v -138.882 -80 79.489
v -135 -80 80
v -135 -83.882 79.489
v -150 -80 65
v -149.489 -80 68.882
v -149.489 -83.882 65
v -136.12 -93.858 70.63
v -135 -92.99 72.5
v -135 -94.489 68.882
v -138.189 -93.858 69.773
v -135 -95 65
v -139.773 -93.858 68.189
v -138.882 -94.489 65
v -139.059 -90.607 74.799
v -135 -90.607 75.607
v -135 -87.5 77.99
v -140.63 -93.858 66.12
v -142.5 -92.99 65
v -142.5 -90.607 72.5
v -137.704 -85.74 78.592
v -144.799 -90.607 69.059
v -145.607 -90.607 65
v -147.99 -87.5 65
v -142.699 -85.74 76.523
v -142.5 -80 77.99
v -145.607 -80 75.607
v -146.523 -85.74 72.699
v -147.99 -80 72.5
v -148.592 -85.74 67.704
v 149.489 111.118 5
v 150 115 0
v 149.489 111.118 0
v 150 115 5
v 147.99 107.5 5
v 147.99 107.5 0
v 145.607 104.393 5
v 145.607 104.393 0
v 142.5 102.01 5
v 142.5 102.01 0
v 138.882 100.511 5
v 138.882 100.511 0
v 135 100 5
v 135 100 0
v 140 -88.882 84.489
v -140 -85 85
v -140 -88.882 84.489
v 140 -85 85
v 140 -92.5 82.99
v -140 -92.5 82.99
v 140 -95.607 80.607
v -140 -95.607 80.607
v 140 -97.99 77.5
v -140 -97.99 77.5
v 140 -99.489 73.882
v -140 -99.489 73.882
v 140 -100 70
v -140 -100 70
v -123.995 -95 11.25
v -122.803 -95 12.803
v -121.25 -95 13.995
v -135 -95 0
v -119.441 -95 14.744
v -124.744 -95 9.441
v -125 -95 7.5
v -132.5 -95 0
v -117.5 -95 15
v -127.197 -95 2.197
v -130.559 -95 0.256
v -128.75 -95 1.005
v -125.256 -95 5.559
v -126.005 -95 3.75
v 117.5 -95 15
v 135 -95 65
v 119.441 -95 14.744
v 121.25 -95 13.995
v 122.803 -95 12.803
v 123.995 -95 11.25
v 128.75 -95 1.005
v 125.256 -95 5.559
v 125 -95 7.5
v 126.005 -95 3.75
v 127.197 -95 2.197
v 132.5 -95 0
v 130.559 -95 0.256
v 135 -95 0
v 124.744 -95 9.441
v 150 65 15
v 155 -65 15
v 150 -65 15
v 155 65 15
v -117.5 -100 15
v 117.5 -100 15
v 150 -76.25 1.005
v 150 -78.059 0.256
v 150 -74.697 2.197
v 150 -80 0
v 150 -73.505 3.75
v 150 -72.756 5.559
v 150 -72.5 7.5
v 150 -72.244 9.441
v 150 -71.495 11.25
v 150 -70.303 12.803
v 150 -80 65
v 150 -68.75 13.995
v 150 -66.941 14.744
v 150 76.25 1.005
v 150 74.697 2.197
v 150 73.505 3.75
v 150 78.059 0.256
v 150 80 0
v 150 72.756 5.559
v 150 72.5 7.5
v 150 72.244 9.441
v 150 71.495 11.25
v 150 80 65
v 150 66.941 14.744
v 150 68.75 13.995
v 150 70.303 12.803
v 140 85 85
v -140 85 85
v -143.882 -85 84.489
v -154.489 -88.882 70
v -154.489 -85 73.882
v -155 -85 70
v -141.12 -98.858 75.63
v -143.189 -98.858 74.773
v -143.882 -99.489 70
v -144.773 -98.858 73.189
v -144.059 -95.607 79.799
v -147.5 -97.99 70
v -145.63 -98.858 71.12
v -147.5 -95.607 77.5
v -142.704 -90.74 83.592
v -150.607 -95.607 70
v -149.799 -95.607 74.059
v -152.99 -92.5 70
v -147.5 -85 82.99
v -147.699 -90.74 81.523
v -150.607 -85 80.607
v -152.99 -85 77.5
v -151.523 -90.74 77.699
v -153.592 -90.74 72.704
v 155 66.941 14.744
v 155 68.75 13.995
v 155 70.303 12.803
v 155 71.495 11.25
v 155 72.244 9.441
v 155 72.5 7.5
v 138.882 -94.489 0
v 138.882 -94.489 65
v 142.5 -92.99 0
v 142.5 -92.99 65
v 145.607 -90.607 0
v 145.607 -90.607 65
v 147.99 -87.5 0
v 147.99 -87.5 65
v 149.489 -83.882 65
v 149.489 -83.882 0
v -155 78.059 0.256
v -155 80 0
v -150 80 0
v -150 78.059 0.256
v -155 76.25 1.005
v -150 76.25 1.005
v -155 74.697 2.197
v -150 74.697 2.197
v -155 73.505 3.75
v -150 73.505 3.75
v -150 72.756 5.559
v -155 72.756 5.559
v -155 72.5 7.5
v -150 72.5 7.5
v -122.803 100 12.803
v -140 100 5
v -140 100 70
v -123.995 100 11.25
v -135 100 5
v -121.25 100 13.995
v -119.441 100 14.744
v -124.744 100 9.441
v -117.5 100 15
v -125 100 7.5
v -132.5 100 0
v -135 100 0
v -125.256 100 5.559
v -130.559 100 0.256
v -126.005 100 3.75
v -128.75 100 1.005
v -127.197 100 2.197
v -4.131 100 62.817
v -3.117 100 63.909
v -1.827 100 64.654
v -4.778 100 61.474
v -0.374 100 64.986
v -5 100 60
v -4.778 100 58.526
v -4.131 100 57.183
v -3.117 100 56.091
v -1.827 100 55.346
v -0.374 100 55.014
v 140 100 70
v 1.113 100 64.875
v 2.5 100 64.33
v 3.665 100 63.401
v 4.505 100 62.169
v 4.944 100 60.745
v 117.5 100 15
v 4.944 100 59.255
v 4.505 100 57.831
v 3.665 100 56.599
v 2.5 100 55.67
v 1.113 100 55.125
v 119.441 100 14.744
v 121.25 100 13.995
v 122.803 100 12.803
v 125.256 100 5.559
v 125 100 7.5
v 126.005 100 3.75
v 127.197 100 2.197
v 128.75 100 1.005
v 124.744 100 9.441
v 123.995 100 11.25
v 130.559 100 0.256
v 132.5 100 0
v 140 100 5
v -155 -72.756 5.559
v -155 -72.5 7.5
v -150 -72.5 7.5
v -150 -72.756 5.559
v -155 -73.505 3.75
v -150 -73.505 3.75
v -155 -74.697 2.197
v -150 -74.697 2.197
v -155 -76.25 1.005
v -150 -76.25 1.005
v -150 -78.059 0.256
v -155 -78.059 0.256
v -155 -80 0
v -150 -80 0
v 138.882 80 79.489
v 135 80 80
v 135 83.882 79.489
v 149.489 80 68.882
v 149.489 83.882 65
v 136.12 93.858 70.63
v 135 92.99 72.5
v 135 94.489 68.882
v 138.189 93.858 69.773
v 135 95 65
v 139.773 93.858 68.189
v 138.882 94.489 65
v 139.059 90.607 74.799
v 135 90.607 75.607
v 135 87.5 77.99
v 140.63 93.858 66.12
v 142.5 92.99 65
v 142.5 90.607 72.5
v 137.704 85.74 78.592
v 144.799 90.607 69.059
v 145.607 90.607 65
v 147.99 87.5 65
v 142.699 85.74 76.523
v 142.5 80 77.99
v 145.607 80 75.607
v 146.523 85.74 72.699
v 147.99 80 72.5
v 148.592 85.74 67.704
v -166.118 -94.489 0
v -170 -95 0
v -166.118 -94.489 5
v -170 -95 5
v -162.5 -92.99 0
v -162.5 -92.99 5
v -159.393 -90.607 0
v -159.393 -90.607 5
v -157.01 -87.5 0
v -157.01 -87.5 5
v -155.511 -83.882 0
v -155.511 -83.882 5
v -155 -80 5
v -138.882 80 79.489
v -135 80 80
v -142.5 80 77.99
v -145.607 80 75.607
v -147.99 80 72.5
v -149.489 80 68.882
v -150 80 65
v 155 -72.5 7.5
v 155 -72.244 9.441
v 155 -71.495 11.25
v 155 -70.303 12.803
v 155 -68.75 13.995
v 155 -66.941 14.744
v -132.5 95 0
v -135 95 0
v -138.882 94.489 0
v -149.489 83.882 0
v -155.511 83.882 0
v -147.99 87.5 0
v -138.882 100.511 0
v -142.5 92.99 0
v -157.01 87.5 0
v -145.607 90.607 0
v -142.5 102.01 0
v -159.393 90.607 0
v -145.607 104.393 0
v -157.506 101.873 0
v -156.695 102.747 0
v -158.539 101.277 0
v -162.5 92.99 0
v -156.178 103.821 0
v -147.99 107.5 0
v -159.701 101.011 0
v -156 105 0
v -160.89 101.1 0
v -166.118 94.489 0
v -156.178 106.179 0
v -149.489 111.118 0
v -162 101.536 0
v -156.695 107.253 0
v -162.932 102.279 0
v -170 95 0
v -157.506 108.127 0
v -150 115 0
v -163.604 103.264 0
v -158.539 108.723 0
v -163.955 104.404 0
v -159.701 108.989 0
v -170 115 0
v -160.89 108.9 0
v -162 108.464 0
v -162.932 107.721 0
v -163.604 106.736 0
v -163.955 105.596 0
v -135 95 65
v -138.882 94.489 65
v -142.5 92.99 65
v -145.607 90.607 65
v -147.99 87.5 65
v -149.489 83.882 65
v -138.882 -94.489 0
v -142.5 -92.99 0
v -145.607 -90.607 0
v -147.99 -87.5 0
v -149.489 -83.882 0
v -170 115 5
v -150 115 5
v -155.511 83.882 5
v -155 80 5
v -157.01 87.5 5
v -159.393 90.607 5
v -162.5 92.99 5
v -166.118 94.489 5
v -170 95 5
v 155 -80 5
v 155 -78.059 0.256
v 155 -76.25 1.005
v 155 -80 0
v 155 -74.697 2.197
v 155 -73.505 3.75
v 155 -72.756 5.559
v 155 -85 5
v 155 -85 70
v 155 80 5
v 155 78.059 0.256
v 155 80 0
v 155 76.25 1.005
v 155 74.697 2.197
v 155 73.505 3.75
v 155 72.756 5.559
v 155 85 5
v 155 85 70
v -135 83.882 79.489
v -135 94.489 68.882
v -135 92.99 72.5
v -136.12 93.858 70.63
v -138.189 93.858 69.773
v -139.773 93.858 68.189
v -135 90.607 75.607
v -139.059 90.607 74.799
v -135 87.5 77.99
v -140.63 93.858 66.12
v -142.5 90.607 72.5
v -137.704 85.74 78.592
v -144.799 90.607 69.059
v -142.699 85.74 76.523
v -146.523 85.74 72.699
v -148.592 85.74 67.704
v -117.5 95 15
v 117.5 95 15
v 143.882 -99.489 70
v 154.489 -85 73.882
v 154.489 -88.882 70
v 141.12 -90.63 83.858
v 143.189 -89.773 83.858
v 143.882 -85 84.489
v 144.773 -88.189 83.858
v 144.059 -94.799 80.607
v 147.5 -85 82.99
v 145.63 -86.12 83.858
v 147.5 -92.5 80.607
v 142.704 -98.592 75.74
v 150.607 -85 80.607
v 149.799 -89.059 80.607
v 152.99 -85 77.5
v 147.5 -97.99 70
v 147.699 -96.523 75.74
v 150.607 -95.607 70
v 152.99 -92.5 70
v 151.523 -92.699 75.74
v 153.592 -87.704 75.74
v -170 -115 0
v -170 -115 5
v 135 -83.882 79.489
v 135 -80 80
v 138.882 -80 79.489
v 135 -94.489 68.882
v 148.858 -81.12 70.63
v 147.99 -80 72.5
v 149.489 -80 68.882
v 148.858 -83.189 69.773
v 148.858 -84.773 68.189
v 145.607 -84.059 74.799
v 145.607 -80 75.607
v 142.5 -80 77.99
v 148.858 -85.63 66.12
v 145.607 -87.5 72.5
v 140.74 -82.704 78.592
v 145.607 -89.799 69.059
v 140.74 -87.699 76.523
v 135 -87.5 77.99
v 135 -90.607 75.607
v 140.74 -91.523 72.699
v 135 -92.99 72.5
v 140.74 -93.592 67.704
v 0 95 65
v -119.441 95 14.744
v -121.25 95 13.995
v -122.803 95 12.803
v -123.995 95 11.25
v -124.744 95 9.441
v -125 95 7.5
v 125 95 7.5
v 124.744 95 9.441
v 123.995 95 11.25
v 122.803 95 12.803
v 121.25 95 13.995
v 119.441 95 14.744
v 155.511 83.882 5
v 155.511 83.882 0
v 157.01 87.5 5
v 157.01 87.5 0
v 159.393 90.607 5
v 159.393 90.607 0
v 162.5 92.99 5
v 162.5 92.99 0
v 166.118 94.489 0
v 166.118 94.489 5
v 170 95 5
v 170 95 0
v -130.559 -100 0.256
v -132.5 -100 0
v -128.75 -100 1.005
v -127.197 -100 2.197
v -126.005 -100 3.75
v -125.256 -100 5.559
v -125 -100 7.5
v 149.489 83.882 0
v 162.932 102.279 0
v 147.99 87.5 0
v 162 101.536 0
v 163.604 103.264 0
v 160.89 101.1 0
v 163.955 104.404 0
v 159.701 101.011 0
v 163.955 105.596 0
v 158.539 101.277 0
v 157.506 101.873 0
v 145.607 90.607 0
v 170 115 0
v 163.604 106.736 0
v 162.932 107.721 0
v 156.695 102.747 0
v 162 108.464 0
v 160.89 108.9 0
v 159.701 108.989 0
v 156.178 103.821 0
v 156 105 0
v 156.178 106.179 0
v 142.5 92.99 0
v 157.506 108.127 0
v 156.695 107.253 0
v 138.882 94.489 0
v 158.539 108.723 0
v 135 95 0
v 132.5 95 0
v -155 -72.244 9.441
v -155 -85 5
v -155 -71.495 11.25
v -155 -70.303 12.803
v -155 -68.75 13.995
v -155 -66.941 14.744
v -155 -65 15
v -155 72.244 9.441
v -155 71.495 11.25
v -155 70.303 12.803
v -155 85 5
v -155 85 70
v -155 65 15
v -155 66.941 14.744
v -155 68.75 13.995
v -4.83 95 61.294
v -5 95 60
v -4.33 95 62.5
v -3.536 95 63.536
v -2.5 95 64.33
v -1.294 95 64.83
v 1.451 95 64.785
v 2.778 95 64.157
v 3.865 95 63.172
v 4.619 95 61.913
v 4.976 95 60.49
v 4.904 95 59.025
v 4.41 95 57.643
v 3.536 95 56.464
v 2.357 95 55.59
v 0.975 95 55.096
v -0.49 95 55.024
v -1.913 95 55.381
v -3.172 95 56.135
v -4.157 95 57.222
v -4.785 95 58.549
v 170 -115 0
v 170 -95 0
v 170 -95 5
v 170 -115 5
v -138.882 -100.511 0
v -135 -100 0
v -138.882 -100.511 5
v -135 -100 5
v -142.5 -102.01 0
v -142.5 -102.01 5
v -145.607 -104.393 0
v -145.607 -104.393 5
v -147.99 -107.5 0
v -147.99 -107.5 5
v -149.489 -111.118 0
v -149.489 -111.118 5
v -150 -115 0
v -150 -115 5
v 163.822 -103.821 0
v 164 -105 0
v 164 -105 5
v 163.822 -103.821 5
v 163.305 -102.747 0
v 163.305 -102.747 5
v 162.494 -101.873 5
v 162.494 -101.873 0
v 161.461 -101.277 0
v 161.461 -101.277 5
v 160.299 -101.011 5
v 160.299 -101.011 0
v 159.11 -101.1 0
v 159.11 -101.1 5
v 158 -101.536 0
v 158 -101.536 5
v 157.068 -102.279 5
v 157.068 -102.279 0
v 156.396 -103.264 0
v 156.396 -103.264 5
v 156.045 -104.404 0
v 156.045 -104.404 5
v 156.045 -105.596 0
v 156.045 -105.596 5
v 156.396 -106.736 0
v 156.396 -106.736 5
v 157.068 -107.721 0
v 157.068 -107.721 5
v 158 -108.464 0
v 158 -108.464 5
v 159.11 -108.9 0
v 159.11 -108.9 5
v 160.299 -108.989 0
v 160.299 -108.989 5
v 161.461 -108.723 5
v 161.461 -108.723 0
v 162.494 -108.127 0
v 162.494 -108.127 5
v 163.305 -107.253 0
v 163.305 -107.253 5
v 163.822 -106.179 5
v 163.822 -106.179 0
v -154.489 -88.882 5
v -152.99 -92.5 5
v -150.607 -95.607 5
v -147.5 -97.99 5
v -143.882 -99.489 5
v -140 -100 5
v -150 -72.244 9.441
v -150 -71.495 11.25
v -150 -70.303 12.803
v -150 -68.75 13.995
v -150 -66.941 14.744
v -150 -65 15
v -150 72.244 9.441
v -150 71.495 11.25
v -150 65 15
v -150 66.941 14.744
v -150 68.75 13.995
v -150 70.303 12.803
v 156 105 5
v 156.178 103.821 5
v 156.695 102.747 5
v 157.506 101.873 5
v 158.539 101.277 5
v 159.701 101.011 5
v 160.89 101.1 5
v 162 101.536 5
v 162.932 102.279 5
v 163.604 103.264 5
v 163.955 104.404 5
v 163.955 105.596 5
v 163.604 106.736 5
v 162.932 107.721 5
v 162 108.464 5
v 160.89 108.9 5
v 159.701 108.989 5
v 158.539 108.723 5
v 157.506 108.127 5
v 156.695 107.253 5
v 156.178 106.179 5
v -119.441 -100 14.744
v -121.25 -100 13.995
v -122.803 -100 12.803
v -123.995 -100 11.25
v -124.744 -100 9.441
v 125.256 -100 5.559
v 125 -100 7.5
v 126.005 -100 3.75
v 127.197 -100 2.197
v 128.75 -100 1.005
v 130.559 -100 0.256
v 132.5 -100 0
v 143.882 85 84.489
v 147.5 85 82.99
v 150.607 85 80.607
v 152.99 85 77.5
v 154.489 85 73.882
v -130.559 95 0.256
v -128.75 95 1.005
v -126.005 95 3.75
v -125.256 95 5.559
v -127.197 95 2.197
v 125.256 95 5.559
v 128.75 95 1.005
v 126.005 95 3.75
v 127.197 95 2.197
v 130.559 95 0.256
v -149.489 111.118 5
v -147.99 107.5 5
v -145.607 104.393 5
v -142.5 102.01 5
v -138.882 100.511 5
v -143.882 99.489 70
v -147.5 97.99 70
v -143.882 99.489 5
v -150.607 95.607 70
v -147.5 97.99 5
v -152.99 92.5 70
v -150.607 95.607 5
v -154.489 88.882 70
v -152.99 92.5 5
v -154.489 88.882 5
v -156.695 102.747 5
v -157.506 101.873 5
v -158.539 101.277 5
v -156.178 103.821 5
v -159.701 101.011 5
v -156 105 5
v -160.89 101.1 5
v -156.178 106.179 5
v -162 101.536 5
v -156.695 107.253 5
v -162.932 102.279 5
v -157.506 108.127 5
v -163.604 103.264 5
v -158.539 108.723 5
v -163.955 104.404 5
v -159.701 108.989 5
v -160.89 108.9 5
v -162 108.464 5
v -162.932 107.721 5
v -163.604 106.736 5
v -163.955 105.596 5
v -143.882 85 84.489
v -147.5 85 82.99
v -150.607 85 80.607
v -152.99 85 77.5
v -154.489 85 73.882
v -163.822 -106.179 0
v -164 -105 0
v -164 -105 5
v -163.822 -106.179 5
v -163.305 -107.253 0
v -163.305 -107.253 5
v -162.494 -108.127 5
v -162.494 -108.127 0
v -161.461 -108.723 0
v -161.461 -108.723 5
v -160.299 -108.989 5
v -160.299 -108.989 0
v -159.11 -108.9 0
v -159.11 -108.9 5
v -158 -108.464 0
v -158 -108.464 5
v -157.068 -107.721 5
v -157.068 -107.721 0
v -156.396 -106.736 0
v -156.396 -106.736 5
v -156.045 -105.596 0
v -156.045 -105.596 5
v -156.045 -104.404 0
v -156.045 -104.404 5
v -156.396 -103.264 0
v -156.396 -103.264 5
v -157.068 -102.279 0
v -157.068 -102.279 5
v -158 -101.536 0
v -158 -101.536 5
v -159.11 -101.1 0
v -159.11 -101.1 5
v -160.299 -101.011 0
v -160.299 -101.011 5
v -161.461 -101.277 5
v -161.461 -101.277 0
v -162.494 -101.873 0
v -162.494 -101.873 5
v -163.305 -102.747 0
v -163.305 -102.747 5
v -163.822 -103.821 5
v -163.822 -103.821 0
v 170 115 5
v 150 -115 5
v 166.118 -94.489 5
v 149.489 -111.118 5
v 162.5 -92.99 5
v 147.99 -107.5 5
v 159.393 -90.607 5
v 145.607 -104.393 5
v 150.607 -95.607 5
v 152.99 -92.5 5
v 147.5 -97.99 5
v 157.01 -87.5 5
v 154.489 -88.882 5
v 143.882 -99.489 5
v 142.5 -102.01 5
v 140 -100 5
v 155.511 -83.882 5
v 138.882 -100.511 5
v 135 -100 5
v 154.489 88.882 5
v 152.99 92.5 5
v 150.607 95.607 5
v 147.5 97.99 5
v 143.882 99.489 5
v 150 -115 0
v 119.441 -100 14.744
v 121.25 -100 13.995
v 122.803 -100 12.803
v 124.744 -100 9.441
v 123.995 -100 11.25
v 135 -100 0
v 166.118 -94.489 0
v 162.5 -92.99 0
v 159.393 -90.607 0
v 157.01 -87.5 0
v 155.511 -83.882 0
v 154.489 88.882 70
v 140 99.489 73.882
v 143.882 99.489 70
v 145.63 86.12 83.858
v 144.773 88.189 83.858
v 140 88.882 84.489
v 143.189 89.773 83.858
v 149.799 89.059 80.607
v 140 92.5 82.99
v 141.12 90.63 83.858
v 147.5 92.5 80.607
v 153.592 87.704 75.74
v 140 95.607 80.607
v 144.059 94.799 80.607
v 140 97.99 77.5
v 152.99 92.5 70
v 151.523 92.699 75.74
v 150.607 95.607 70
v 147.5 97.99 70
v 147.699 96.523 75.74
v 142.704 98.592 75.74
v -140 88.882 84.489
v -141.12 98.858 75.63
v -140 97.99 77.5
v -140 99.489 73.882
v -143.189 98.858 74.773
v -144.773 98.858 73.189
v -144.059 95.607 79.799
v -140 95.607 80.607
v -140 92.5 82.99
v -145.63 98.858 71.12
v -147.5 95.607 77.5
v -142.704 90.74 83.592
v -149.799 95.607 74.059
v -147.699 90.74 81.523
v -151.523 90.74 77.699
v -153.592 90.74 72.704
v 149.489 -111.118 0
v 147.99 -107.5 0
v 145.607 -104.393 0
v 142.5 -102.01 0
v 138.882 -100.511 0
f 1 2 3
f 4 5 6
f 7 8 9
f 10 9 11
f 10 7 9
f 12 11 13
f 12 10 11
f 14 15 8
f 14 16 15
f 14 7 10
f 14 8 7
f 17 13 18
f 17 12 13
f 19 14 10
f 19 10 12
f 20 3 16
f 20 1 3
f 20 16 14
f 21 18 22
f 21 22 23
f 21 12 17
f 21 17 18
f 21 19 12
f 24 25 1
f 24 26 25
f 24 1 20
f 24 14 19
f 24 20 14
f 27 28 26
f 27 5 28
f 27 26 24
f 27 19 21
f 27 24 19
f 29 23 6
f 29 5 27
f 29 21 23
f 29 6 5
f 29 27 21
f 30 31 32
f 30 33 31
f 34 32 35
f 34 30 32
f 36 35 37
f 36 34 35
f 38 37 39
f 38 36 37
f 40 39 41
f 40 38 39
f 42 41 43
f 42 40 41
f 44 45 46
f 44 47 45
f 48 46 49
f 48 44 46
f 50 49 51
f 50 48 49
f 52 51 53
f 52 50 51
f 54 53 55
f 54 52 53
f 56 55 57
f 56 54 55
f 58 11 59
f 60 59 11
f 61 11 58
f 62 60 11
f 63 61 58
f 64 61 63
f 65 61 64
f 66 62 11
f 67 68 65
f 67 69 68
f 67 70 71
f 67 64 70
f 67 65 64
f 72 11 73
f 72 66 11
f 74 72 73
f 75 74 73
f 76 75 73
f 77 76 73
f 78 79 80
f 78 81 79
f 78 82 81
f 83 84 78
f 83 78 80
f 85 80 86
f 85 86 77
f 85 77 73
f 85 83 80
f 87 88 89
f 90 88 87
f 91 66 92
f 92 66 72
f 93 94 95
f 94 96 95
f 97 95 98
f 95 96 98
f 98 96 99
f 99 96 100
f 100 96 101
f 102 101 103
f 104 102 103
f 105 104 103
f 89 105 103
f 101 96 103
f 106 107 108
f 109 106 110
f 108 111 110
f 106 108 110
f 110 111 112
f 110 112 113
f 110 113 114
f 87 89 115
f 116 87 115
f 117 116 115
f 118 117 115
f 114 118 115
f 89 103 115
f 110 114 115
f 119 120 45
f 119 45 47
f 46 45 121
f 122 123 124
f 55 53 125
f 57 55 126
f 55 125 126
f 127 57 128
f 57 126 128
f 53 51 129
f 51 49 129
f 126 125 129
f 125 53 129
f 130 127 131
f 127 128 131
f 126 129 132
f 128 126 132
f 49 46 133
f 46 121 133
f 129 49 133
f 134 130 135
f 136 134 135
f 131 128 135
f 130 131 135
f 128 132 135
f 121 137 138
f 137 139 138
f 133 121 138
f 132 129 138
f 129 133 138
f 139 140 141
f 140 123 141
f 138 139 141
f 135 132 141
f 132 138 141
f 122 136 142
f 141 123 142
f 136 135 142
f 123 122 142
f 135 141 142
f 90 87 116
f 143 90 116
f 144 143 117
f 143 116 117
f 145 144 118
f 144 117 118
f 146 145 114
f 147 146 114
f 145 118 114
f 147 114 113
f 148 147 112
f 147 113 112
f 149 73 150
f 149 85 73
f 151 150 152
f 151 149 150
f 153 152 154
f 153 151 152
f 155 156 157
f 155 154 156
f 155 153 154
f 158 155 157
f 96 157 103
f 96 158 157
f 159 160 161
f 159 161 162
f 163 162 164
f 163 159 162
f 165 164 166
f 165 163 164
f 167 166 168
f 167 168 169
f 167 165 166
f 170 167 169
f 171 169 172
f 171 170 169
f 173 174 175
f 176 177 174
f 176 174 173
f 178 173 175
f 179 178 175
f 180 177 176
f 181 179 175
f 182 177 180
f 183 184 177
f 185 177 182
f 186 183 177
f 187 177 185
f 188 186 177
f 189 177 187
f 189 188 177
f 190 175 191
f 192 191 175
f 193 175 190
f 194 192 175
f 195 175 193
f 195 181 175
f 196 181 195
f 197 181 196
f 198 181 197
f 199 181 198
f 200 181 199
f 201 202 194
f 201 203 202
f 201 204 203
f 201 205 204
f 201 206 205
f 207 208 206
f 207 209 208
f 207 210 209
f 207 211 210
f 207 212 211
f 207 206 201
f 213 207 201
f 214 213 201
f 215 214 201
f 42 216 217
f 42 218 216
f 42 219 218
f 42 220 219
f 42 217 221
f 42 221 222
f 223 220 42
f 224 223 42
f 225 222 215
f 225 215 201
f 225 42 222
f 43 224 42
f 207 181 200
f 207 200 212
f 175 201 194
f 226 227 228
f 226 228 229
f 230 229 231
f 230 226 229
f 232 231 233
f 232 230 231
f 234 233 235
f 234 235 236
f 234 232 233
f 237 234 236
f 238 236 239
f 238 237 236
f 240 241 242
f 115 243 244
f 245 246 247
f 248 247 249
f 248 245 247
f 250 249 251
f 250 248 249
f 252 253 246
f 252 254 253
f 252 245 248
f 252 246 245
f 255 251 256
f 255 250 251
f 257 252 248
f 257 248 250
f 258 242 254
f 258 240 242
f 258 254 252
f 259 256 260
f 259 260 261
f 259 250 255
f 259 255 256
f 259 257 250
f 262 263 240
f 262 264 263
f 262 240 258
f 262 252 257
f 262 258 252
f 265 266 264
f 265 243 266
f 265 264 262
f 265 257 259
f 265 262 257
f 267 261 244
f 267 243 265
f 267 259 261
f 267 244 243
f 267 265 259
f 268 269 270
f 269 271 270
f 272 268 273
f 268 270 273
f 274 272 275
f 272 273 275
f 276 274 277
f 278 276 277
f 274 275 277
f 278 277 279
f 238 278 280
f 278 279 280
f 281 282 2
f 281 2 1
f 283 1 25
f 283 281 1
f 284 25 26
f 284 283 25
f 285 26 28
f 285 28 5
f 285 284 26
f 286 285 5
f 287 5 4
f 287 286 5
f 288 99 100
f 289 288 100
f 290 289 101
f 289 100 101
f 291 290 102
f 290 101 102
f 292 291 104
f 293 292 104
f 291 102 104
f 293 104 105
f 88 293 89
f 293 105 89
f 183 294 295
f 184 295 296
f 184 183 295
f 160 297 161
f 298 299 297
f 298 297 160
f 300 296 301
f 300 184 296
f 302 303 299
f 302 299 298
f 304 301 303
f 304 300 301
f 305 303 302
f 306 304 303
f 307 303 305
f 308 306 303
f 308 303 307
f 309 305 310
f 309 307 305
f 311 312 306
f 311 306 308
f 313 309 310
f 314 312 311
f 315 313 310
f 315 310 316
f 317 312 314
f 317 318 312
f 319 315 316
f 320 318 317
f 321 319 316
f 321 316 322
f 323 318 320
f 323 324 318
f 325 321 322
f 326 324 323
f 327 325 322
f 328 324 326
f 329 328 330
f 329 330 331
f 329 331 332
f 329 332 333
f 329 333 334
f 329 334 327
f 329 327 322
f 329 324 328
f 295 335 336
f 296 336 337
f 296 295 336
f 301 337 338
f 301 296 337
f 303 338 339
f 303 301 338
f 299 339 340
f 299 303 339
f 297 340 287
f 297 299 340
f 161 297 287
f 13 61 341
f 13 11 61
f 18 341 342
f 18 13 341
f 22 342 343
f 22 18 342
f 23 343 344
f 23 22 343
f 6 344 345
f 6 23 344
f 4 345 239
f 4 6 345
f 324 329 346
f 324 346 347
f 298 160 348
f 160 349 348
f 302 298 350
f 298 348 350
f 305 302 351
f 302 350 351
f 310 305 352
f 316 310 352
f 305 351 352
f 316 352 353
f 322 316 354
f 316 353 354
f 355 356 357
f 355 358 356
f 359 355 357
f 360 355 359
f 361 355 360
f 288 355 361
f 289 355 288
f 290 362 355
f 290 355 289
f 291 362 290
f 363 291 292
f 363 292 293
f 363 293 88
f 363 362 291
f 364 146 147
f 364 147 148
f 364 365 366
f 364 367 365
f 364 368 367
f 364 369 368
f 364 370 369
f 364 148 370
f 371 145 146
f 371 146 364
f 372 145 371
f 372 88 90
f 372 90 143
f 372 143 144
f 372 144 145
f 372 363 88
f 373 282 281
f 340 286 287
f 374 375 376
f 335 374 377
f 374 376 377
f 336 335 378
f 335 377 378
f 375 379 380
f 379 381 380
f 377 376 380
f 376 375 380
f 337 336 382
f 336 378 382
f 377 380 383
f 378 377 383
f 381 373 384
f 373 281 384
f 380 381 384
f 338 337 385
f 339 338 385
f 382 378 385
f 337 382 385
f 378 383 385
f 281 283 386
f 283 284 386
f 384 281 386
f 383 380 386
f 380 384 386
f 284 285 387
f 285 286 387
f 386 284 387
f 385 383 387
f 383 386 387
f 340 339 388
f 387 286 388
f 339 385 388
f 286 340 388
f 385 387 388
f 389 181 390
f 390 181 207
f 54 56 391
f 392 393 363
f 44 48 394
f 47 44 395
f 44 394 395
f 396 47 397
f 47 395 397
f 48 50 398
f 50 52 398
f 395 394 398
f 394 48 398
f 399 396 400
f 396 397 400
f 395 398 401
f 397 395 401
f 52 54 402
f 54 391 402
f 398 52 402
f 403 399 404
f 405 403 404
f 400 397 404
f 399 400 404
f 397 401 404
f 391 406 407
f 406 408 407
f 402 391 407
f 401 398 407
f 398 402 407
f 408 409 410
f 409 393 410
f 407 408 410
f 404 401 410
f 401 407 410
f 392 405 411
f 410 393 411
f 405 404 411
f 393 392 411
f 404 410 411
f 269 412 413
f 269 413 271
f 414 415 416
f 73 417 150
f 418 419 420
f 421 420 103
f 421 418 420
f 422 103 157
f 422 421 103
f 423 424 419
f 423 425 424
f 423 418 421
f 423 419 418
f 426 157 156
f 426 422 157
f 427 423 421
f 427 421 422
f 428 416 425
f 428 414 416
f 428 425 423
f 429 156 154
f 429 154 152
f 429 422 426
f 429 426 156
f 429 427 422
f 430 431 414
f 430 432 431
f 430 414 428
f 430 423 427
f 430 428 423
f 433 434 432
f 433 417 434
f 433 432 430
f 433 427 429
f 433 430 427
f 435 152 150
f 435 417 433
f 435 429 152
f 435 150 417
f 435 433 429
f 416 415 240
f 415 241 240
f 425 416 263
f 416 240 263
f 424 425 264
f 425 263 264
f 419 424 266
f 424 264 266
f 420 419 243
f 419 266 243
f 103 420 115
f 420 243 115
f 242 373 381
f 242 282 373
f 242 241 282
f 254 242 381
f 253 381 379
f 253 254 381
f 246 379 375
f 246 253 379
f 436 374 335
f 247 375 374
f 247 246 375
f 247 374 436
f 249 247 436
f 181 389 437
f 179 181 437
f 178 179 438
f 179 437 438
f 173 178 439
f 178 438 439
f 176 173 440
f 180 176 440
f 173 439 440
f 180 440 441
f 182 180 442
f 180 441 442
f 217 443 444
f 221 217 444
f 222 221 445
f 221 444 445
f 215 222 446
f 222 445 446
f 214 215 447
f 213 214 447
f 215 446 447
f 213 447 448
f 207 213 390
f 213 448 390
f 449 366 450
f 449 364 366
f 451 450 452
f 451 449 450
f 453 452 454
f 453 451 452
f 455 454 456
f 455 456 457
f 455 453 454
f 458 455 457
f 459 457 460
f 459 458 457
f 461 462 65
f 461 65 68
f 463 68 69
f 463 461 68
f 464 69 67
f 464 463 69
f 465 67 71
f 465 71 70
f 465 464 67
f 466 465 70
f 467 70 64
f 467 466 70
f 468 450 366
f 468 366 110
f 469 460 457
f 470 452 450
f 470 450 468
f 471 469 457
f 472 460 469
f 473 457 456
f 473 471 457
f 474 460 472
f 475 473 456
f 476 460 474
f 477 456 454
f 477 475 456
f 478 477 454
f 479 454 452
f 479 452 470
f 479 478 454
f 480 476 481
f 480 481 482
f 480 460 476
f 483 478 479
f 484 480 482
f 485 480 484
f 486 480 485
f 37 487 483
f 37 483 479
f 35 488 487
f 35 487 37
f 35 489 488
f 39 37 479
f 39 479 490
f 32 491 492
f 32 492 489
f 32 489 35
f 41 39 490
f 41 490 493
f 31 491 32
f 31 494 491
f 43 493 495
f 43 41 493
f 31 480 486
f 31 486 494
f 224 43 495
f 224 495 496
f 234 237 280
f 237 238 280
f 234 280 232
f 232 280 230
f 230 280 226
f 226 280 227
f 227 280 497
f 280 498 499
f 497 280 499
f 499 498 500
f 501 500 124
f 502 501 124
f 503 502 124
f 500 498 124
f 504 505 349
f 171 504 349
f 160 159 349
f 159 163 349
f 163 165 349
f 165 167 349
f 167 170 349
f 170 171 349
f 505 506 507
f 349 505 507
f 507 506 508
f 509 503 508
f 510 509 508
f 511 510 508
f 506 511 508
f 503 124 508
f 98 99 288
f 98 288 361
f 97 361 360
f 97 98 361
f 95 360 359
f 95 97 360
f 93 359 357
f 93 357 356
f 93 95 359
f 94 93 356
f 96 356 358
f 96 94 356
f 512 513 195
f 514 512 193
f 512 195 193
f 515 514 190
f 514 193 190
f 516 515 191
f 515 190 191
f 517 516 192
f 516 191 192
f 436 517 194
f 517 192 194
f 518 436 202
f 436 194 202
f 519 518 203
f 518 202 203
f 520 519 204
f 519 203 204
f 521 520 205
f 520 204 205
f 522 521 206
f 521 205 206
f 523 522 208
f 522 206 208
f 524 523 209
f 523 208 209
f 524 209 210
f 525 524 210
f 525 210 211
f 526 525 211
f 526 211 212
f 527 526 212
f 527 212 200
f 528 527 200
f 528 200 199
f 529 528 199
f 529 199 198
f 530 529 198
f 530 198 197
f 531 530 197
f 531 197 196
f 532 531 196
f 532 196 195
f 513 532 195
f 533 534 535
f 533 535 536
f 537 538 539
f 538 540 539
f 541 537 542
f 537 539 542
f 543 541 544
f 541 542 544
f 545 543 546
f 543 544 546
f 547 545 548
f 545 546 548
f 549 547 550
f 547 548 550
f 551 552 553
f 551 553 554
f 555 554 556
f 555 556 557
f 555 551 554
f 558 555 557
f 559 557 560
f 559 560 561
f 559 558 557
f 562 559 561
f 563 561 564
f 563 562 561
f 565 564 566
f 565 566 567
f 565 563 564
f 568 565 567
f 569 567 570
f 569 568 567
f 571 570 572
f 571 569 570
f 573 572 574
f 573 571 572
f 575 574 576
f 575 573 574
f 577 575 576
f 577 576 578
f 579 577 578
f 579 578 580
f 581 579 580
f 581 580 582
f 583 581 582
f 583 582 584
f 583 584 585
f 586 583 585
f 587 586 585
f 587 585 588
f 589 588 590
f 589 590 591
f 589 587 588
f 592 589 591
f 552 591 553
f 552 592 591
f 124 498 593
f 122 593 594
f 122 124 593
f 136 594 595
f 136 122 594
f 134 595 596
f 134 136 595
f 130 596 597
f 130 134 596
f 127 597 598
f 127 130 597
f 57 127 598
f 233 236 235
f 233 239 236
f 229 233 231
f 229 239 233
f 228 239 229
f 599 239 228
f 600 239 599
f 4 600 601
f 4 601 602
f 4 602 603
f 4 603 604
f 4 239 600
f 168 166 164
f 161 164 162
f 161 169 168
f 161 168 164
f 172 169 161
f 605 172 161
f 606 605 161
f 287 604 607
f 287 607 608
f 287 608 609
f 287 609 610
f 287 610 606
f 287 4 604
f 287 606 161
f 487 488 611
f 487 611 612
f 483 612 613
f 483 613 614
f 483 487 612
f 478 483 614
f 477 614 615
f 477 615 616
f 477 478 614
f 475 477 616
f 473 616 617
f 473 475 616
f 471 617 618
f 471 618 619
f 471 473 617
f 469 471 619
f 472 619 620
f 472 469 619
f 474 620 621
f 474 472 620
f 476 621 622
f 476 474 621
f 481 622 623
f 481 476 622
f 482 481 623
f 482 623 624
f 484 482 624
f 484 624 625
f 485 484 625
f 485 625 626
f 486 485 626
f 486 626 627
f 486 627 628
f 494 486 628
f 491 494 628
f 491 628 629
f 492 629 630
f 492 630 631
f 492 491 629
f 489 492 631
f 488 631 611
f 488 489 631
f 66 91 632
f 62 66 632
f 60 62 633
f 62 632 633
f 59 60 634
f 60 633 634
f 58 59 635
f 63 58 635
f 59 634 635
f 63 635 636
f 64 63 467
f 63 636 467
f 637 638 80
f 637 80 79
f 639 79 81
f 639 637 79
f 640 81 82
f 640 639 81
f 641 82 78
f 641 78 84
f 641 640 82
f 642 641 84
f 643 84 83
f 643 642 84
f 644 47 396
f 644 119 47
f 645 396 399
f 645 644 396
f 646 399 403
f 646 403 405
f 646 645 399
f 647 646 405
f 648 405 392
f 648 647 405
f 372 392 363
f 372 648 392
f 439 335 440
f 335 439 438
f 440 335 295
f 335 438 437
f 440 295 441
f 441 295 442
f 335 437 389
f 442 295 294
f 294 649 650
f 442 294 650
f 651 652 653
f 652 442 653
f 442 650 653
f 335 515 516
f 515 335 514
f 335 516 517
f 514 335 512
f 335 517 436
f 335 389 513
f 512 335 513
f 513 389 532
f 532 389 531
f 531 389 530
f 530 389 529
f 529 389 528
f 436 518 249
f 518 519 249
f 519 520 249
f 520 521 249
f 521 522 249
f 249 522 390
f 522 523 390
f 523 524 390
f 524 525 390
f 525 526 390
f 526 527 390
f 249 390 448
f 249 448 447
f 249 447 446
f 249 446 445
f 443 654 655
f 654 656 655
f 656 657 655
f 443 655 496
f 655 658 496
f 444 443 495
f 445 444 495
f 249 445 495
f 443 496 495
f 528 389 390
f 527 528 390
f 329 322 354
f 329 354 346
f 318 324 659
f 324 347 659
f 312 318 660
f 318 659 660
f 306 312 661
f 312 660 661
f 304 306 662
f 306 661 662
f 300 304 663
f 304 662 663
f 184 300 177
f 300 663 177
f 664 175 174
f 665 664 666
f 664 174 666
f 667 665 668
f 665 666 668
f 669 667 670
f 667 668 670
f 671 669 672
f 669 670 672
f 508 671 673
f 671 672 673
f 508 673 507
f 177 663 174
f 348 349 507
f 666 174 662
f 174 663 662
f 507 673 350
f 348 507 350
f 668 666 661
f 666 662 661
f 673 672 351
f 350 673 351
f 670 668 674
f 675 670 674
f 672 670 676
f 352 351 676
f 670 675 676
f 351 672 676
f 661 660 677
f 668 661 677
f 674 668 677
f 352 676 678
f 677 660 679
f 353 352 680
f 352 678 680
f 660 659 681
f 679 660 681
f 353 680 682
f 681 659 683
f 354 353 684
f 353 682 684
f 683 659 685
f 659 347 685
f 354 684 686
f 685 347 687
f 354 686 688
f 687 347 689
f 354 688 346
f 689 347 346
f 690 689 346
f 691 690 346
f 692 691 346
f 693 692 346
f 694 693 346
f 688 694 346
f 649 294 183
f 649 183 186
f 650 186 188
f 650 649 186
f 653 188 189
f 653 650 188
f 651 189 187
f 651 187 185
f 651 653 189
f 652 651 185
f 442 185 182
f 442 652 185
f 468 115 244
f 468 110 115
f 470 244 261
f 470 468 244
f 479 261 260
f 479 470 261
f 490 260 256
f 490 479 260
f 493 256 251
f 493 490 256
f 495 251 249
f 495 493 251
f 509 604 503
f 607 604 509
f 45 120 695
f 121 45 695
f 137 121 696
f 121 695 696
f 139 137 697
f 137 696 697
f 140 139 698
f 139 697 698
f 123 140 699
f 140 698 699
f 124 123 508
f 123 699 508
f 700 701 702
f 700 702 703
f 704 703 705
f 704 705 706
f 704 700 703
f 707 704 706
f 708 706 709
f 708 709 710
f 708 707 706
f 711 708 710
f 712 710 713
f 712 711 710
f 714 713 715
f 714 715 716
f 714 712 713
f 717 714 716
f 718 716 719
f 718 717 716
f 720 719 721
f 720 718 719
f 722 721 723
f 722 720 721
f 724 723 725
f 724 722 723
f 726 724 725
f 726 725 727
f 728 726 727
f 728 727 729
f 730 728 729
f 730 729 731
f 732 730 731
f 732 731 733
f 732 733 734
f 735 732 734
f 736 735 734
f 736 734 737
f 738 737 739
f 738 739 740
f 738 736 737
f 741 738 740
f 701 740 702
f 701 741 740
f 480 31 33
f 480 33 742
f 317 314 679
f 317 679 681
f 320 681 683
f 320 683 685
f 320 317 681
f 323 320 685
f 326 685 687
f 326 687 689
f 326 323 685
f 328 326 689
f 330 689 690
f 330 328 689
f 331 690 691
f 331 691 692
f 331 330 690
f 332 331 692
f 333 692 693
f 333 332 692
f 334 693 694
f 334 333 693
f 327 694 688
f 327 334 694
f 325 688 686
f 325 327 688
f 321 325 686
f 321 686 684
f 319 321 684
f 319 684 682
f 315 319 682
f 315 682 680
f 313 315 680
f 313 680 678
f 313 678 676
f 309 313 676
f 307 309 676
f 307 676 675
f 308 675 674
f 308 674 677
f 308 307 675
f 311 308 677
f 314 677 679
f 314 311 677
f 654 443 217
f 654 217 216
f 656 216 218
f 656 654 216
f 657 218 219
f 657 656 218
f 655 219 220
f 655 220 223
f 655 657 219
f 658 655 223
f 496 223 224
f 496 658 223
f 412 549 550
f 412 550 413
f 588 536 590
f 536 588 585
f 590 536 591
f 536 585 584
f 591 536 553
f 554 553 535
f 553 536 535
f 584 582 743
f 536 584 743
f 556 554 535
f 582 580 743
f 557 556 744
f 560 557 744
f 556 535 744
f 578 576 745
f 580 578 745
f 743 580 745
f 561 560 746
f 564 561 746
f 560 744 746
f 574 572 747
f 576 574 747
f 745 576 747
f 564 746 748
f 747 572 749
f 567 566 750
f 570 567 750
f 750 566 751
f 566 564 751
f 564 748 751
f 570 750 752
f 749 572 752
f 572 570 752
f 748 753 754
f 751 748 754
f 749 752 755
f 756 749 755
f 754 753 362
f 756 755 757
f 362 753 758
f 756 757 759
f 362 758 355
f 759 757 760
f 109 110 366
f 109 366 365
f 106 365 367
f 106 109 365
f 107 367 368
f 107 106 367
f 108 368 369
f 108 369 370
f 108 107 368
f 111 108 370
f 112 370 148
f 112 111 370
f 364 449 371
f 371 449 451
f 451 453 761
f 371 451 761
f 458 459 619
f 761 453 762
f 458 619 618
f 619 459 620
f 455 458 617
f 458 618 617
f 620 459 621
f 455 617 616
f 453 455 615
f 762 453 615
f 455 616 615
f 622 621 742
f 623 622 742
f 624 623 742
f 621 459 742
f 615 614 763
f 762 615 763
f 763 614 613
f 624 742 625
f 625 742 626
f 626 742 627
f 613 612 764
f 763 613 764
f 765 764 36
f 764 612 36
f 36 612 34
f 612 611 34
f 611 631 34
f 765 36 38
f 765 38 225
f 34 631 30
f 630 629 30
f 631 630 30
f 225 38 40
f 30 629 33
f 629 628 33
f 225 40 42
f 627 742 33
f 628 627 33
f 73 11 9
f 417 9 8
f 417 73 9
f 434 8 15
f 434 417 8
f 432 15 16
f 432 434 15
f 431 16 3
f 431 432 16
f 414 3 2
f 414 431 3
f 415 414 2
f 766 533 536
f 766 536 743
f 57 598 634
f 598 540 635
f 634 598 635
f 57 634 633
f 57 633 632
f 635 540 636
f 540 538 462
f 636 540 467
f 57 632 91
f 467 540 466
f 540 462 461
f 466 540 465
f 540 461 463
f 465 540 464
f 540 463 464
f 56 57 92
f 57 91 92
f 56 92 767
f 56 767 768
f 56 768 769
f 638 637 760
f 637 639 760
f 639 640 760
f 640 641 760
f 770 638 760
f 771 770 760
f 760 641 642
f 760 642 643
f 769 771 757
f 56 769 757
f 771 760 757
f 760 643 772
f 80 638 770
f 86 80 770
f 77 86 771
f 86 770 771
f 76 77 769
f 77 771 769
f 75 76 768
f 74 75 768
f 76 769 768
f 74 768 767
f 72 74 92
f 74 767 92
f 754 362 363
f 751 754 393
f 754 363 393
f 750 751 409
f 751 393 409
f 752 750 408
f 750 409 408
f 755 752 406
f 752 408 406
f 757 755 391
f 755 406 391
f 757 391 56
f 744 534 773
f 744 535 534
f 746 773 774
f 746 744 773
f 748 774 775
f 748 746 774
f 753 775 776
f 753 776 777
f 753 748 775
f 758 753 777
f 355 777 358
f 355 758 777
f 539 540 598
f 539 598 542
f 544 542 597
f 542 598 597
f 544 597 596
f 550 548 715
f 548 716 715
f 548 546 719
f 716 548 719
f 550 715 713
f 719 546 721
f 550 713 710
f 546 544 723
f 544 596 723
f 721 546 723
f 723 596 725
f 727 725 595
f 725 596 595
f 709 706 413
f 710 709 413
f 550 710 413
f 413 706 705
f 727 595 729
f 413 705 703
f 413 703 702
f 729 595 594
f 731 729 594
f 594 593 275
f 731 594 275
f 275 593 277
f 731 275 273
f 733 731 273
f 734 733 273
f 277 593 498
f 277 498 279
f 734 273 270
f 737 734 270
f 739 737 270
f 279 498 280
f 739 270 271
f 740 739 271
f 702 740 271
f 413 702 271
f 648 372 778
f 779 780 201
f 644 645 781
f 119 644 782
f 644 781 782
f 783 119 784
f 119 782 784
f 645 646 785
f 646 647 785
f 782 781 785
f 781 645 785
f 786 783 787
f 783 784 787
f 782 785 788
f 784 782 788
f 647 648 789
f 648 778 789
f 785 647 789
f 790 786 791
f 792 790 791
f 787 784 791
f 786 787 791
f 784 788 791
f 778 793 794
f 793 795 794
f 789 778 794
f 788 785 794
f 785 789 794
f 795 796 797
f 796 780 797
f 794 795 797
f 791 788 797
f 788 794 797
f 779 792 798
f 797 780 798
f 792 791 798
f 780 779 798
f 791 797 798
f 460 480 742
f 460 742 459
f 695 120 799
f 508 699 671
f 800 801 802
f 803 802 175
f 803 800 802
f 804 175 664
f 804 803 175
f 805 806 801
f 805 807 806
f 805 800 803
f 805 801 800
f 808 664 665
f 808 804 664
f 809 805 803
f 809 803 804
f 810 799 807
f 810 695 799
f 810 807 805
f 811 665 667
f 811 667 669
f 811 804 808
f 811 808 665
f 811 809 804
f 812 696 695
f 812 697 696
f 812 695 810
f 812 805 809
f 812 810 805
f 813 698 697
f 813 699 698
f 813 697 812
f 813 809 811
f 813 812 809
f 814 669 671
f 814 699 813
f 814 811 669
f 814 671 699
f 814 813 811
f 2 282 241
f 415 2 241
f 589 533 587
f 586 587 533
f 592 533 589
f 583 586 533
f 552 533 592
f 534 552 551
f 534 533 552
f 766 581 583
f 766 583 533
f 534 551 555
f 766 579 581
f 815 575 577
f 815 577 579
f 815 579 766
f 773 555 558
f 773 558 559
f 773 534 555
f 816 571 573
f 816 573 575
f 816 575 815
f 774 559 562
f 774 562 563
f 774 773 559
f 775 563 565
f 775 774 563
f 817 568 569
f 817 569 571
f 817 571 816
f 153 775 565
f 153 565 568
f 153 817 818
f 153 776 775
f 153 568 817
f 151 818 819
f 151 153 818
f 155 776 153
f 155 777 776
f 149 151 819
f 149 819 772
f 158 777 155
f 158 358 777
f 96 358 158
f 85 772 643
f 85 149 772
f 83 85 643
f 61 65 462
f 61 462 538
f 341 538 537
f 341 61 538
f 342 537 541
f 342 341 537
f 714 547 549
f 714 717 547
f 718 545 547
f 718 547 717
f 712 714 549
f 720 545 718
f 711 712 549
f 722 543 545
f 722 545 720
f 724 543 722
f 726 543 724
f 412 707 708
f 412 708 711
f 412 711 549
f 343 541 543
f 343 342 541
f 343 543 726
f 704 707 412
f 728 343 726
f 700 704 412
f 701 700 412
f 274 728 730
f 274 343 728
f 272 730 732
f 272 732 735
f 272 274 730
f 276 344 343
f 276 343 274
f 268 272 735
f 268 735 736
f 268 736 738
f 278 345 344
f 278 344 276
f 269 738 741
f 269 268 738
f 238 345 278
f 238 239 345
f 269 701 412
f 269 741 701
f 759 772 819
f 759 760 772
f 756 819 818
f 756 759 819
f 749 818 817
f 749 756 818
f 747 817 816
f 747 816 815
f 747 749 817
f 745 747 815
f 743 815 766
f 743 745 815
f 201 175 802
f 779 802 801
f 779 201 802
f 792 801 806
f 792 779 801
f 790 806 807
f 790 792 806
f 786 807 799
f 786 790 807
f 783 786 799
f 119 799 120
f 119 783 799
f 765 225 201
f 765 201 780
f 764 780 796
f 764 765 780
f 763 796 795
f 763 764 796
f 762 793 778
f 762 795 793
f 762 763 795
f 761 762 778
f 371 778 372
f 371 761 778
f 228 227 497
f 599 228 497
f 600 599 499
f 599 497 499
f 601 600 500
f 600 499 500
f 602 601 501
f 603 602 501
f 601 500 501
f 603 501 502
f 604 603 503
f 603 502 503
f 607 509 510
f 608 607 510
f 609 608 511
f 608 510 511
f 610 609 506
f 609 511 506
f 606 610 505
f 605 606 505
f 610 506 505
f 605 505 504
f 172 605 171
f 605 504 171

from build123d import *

# Parameters (mm, degrees)
SKETCH2_R           = 4
SKETCH2_W           = 300
SKETCH2_H           = 190
BOSS_EXTRUDE1_DEPTH = 5
SKETCH3_W           = 310
SKETCH3_H           = 200
SKETCH3_W_2         = 300
SKETCH3_H_2         = 190
BOSS_EXTRUDE2_DEPTH = 75
SKETCH4_W           = 310
SKETCH4_H           = 200
BOSS_EXTRUDE3_DEPTH = 5
FILLET2_R           = 15
FILLET3_R           = 15
FILLET4_R           = 15
SKETCH5_R           = 5
CUT_EXTRUDE1_DEPTH  = 5
SKETCH6_W           = 250
SKETCH6_H           = 30
CUT_EXTRUDE2_DEPTH  = 400
SKETCH7_W           = 30
SKETCH7_H           = 145
CUT_EXTRUDE3_DEPTH  = 400
FILLET5_START       = -155
FILLET5_DEPTH       = 5
FILLET5_START_2     = 150
FILLET5_2_DEPTH     = 5
FILLET5_START_3     = -100
FILLET5_3_DEPTH     = 5
FILLET5_START_4     = 95
FILLET5_4_DEPTH     = 5
FILLET5_START_5     = -170
FILLET5_5_DEPTH     = 340
FILLET5_START_6     = -115
FILLET5_6_DEPTH     = 230


with BuildPart() as part:
    # Sketch2 → Boss-Extrude1 (new body)
    with BuildSketch(Plane.XY):
        Polygon((150, -100), (-150, -100), (-150, -115), (-170, -115), (-170, -95), (-155, -95), (-155, 95), (-170, 95), (-170, 115), (-150, 115), (-150, 100), (150, 100), (150, 115), (170, 115), (170, 95), (155, 95), (155, -95), (170, -95), (170, -115), (150, -115), align=None)
        with Locations((-160, 105)):
            Circle(SKETCH2_R, mode=Mode.SUBTRACT)
        with Locations(Location((160, 105, 0), (0, 0, 180))):
            Circle(SKETCH2_R, mode=Mode.SUBTRACT)
        with Locations((160, -105)):
            Circle(SKETCH2_R, mode=Mode.SUBTRACT)
        with Locations(Location((-160, -105, 0), (0, 0, 180))):
            Circle(SKETCH2_R, mode=Mode.SUBTRACT)
        Rectangle(SKETCH2_W, SKETCH2_H, mode=Mode.SUBTRACT)
    extrude(amount=BOSS_EXTRUDE1_DEPTH)

    # Sketch3 → Boss-Extrude2 (add)
    with BuildSketch(Plane.XY.offset(5)):
        Rectangle(SKETCH3_W, SKETCH3_H)
        Rectangle(SKETCH3_W_2, SKETCH3_H_2, mode=Mode.SUBTRACT)
    extrude(amount=BOSS_EXTRUDE2_DEPTH)

    # Sketch4 → Boss-Extrude3 (add)
    with BuildSketch(Plane.XY.offset(80)):
        Rectangle(SKETCH4_W, SKETCH4_H)
    extrude(amount=BOSS_EXTRUDE3_DEPTH)

    # Fillet2
    fillet2_edges = [part.edges().sort_by_distance(p)[0] for p in [
        (-150, 0, 80),
        (0, -95, 80),
        (150, 0, 80),
        (0, 95, 80),
        (150, -95, 40),
        (150, 95, 40),
        (-150, 95, 40),
        (-150, -95, 40),
    ]]
    fillet(fillet2_edges, radius=FILLET2_R)

    # Fillet3
    fillet3_edges = [part.edges().sort_by_distance(p)[0] for p in [
        (-155, -95, 2.5),
        (-150, -100, 2.5),
        (150, -100, 2.5),
        (155, -95, 2.5),
        (155, 95, 2.5),
        (150, 100, 2.5),
        (-155, 95, 2.5),
        (-150, 100, 2.5),
    ]]
    fillet(fillet3_edges, radius=FILLET3_R - 0.0001)  # a hair under: the kernel refuses the full size

    # Fillet4
    fillet4_edges = [part.edges().sort_by_distance(p)[0] for p in [
        (155, -100, 45),
        (155, 100, 45),
        (-155, 0, 85),
        (0, -100, 85),
        (155, 0, 85),
        (0, 100, 85),
        (-155, 100, 45),
        (-155, -100, 45),
    ]]
    fillet(fillet4_edges, radius=FILLET4_R)

    # Sketch5 → Cut-Extrude1 (cut)
    with BuildSketch(Plane(origin=(0, 100, 0), x_dir=(1, 0, 0), z_dir=(0, 1, 0))):
        with Locations(Location((0, -60, 0), (0, 0, 180))):
            Circle(SKETCH5_R)
    extrude(amount=-CUT_EXTRUDE1_DEPTH, mode=Mode.SUBTRACT)

    # Sketch6 → Cut-Extrude2 (cut)
    with BuildSketch(Plane(origin=(0, 100, 0), x_dir=(1, 0, 0), z_dir=(0, 1, 0))):
        Rectangle(SKETCH6_W, SKETCH6_H)
    extrude(amount=-CUT_EXTRUDE2_DEPTH, mode=Mode.SUBTRACT)

    # Sketch7 → Cut-Extrude3 (cut)
    with BuildSketch(Plane(origin=(155, 0, 0), x_dir=(0, 0, -1), z_dir=(1, 0, 0))):
        Rectangle(SKETCH7_W, SKETCH7_H)
    extrude(amount=-CUT_EXTRUDE3_DEPTH, mode=Mode.SUBTRACT)

    # Fillet5: read off the stored shape, not the designer's step
    # Fillet5 outline → Fillet5 (add)
    with BuildSketch(Plane.YZ.offset(FILLET5_START)):
        with BuildLine():
            Line((72.5, 15), (65, 15))
            ThreePointArc((65, 15), (70.303300859, 12.803300859), (72.5, 7.5))
            Line((72.5, 7.5), (72.5, 15))
        make_face()
        with BuildLine():
            Line((-72.5, 15), (-72.5, 7.5))
            ThreePointArc((-72.5, 7.5), (-70.303300859, 12.803300859), (-65, 15))
            Line((-65, 15), (-72.5, 15))
        make_face()
    extrude(amount=FILLET5_DEPTH)

    # Fillet5 2 outline → Fillet5 2 (add)
    with BuildSketch(Plane.YZ.offset(FILLET5_START_2)):
        with BuildLine():
            Line((72.5, 15), (65, 15))
            ThreePointArc((65, 15), (70.303300859, 12.803300859), (72.5, 7.5))
            Line((72.5, 7.5), (72.5, 15))
        make_face()
        with BuildLine():
            Line((-72.5, 15), (-72.5, 7.5))
            ThreePointArc((-72.5, 7.5), (-70.303300859, 12.803300859), (-65, 15))
            Line((-65, 15), (-72.5, 15))
        make_face()
    extrude(amount=FILLET5_2_DEPTH)

    # Fillet5 3 outline → Fillet5 3 (add)
    with BuildSketch(Plane(origin=(0, 0, 0), x_dir=(1, 0, 0), z_dir=(0, 1, 0)).offset(FILLET5_START_3)):
        with BuildLine():
            ThreePointArc((125, -7.5), (122.803300859, -12.803300859), (117.5, -15))
            Line((117.5, -15), (125, -15))
            Line((125, -15), (125, -7.5))
        make_face()
        with BuildLine():
            ThreePointArc((-117.5, -15), (-122.803300859, -12.803300859), (-125, -7.5))
            Line((-125, -7.5), (-125, -15))
            Line((-125, -15), (-117.5, -15))
        make_face()
    extrude(amount=FILLET5_3_DEPTH)

    # Fillet5 4 outline → Fillet5 4 (add)
    with BuildSketch(Plane(origin=(0, 0, 0), x_dir=(1, 0, 0), z_dir=(0, 1, 0)).offset(FILLET5_START_4)):
        with BuildLine():
            ThreePointArc((125, -7.5), (122.803300859, -12.803300859), (117.5, -15))
            Line((117.5, -15), (125, -15))
            Line((125, -15), (125, -7.5))
        make_face()
        with BuildLine():
            ThreePointArc((-117.5, -15), (-122.803300859, -12.803300859), (-125, -7.5))
            Line((-125, -7.5), (-125, -15))
            Line((-125, -15), (-117.5, -15))
        make_face()
    extrude(amount=FILLET5_4_DEPTH)

    # Fillet5 5 outline → Fillet5 5 (cut)
    with BuildSketch(Plane.YZ.offset(FILLET5_START_5)):
        with BuildLine():
            ThreePointArc((80, 0), (74.696699141, 2.196699141), (72.5, 7.5))
            Line((72.5, 7.5), (72.5, 0))
            Line((72.5, 0), (80, 0))
        make_face()
        with BuildLine():
            ThreePointArc((-72.5, 7.5), (-74.696699141, 2.196699141), (-80, 0))
            Line((-80, 0), (-72.5, 0))
            Line((-72.5, 0), (-72.5, 7.5))
        make_face()
    extrude(amount=FILLET5_5_DEPTH, mode=Mode.SUBTRACT)

    # Fillet5 6 outline → Fillet5 6 (cut)
    with BuildSketch(Plane(origin=(0, 0, 0), x_dir=(1, 0, 0), z_dir=(0, 1, 0)).offset(FILLET5_START_6)):
        with BuildLine():
            Line((-125, 0), (-132.5, 0))
            ThreePointArc((-132.5, 0), (-127.196699141, -2.196699141), (-125, -7.5))
            Line((-125, -7.5), (-125, 0))
        make_face()
        with BuildLine():
            Line((125, 0), (125, -7.5))
            ThreePointArc((125, -7.5), (127.196699141, -2.196699141), (132.5, 0))
            Line((132.5, 0), (125, 0))
        make_face()
    extrude(amount=FILLET5_6_DEPTH, mode=Mode.SUBTRACT)


solid = part.part
